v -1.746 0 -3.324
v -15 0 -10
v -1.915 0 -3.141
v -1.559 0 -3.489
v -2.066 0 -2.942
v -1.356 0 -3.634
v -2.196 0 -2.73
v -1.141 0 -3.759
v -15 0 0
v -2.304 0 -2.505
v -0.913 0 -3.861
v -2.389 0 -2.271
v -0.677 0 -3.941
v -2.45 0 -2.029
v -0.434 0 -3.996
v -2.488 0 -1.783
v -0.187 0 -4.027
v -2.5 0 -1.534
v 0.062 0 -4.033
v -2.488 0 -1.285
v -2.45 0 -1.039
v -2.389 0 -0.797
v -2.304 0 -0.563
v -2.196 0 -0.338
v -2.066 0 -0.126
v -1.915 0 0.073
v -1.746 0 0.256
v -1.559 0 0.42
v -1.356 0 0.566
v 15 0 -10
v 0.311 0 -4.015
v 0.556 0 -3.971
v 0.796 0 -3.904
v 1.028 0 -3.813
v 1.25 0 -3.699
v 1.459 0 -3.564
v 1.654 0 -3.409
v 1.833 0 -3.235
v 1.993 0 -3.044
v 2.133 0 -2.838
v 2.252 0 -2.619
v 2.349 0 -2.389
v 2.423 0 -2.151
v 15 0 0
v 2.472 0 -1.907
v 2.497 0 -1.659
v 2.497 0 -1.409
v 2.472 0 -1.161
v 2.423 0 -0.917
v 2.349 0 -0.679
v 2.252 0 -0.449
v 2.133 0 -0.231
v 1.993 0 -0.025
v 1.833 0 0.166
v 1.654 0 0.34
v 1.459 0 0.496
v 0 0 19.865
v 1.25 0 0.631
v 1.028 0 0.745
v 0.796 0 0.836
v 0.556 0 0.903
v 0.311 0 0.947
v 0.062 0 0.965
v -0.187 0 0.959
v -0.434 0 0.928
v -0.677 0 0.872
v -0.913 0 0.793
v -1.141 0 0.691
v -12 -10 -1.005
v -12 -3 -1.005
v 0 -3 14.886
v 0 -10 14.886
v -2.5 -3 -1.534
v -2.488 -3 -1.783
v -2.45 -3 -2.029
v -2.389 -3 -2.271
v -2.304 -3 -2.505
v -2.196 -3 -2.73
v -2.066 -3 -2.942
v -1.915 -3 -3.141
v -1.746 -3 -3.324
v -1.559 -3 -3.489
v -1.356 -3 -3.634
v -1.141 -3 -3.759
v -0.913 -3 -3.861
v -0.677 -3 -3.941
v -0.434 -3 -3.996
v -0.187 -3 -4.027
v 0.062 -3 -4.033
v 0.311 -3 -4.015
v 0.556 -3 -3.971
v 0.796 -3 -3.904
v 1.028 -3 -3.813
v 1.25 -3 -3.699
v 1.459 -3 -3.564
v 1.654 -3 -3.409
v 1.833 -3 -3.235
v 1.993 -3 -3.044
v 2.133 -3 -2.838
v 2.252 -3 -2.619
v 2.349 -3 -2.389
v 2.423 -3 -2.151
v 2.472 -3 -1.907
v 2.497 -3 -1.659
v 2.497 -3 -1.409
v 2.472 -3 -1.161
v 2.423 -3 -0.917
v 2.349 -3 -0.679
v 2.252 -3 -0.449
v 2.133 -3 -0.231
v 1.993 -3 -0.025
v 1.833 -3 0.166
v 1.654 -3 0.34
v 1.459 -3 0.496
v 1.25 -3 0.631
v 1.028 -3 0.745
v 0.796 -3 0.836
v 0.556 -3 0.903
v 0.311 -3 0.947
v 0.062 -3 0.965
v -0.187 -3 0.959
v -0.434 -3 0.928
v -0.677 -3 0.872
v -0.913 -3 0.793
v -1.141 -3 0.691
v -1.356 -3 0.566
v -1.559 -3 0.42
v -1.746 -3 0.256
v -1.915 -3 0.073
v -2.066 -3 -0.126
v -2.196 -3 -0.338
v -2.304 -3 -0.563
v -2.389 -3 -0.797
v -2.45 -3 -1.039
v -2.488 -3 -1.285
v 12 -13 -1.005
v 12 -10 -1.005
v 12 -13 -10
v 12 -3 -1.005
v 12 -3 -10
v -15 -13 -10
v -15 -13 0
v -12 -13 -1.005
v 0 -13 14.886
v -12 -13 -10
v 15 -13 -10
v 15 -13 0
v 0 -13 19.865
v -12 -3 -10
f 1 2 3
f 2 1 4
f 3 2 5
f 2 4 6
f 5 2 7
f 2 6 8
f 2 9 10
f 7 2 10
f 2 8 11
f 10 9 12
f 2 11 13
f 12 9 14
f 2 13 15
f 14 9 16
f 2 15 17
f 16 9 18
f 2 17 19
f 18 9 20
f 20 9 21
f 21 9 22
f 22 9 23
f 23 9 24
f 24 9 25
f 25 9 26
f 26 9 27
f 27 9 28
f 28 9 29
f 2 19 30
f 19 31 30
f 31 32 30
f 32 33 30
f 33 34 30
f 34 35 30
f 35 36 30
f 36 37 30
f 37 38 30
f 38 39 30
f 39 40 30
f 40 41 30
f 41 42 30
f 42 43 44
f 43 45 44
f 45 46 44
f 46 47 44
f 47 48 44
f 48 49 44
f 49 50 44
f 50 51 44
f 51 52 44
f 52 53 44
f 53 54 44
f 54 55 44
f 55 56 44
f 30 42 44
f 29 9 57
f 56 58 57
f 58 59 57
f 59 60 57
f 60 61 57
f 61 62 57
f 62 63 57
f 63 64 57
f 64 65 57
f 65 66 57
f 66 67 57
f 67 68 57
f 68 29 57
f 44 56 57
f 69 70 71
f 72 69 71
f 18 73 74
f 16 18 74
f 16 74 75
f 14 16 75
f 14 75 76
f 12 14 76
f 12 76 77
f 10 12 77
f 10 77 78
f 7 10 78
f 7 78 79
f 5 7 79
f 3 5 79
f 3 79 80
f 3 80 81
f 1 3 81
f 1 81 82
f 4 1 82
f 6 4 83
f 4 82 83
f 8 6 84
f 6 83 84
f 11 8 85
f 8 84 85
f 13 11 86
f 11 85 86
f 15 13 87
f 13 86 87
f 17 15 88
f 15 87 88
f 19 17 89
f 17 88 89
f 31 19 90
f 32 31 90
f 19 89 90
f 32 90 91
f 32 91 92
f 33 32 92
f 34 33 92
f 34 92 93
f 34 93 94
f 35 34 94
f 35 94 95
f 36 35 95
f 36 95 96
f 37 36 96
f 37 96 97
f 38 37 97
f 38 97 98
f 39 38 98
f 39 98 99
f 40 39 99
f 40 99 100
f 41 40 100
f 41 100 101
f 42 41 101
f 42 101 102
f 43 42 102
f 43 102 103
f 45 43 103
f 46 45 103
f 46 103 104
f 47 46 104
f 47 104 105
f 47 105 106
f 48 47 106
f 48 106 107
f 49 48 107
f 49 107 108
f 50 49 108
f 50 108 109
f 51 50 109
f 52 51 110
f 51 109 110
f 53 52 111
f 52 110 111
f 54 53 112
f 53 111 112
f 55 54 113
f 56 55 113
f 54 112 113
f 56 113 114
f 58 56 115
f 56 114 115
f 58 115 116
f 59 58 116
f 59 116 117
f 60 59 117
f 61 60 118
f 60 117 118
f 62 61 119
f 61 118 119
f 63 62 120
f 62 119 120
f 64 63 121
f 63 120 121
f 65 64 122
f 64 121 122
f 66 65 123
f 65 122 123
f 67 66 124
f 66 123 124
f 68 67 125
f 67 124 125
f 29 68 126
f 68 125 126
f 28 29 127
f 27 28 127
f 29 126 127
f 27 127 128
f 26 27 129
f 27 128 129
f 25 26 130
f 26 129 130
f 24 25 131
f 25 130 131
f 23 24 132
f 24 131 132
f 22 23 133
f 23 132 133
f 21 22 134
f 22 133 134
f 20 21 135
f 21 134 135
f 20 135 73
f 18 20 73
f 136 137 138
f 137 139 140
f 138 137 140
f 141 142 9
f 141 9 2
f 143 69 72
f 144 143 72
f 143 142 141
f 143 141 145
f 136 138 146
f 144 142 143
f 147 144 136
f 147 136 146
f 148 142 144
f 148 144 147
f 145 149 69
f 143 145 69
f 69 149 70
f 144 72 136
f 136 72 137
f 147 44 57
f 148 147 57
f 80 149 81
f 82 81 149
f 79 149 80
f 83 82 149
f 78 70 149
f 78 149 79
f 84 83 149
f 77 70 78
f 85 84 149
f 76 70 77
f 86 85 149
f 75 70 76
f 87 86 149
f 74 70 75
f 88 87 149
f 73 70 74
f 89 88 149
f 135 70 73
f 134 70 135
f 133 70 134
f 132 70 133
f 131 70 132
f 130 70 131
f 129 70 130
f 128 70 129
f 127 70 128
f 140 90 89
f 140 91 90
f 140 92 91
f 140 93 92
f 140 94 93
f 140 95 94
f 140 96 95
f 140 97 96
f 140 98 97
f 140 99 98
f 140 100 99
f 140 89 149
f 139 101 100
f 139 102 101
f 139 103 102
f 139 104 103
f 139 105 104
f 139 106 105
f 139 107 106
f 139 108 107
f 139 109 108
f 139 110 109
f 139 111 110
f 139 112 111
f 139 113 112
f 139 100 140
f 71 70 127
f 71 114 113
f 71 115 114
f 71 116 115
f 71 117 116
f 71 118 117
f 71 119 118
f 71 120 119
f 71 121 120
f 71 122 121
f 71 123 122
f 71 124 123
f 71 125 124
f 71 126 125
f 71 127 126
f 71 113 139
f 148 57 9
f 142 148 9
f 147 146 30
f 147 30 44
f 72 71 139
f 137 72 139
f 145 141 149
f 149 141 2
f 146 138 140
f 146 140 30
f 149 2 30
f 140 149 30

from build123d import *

# Parameters (mm, degrees)
F1_DEPTH = 10
F2_DEPTH = 3
F3_D     = 5
F3_DEPTH = 12
F3_TIP   = 1.5021515476


with BuildPart() as f1:
    # F0 (on Front) → F1 (new body)
    with BuildSketch(Plane.XZ):
        Polygon((0, 19.8648640182), (-15, 0), (-15, -10), (-12, -10), (-12, -1.0054318503), (0, 14.8864593642), (12, -1.0054318503), (12, -10), (15, -10), (15, 0), align=None)
    extrude(amount=F1_DEPTH)

    # F0 (on Front) + F1_face (on face) → F2 (join)
    with BuildSketch(Plane.XZ):
        Polygon((-12, -1.0054318503), (-12, -10), (12, -10), (12, -1.0054318503), (0, 14.8864593642), align=None)
    with BuildSketch(Plane(origin=(0, -10, 4.4015692683), x_dir=(1, 0, 0), z_dir=(0, -1, 0))):
        Polygon((0, 15.4632947499), (-15, -4.4015692683), (-15, -14.4015692683), (-12, -14.4015692683), (-12, -5.4070011186), (0, 10.484890096), (12, -5.4070011186), (12, -14.4015692683), (15, -14.4015692683), (15, -4.4015692683), align=None)
    extrude(amount=F2_DEPTH)

    # F3
    with Locations(Plane(origin=(0, 0, 0), x_dir=(1, 0, 0), z_dir=(0, 1, 0))):
        with Locations((0, 1.5340909595)):
            Hole(F3_D / 2, depth=F3_DEPTH)
            with Locations((0, 0, -(F3_DEPTH + F3_TIP / 2))):  # 118° drill point
                Cone(0, F3_D / 2, F3_TIP, mode=Mode.SUBTRACT)


solid = f1.part
